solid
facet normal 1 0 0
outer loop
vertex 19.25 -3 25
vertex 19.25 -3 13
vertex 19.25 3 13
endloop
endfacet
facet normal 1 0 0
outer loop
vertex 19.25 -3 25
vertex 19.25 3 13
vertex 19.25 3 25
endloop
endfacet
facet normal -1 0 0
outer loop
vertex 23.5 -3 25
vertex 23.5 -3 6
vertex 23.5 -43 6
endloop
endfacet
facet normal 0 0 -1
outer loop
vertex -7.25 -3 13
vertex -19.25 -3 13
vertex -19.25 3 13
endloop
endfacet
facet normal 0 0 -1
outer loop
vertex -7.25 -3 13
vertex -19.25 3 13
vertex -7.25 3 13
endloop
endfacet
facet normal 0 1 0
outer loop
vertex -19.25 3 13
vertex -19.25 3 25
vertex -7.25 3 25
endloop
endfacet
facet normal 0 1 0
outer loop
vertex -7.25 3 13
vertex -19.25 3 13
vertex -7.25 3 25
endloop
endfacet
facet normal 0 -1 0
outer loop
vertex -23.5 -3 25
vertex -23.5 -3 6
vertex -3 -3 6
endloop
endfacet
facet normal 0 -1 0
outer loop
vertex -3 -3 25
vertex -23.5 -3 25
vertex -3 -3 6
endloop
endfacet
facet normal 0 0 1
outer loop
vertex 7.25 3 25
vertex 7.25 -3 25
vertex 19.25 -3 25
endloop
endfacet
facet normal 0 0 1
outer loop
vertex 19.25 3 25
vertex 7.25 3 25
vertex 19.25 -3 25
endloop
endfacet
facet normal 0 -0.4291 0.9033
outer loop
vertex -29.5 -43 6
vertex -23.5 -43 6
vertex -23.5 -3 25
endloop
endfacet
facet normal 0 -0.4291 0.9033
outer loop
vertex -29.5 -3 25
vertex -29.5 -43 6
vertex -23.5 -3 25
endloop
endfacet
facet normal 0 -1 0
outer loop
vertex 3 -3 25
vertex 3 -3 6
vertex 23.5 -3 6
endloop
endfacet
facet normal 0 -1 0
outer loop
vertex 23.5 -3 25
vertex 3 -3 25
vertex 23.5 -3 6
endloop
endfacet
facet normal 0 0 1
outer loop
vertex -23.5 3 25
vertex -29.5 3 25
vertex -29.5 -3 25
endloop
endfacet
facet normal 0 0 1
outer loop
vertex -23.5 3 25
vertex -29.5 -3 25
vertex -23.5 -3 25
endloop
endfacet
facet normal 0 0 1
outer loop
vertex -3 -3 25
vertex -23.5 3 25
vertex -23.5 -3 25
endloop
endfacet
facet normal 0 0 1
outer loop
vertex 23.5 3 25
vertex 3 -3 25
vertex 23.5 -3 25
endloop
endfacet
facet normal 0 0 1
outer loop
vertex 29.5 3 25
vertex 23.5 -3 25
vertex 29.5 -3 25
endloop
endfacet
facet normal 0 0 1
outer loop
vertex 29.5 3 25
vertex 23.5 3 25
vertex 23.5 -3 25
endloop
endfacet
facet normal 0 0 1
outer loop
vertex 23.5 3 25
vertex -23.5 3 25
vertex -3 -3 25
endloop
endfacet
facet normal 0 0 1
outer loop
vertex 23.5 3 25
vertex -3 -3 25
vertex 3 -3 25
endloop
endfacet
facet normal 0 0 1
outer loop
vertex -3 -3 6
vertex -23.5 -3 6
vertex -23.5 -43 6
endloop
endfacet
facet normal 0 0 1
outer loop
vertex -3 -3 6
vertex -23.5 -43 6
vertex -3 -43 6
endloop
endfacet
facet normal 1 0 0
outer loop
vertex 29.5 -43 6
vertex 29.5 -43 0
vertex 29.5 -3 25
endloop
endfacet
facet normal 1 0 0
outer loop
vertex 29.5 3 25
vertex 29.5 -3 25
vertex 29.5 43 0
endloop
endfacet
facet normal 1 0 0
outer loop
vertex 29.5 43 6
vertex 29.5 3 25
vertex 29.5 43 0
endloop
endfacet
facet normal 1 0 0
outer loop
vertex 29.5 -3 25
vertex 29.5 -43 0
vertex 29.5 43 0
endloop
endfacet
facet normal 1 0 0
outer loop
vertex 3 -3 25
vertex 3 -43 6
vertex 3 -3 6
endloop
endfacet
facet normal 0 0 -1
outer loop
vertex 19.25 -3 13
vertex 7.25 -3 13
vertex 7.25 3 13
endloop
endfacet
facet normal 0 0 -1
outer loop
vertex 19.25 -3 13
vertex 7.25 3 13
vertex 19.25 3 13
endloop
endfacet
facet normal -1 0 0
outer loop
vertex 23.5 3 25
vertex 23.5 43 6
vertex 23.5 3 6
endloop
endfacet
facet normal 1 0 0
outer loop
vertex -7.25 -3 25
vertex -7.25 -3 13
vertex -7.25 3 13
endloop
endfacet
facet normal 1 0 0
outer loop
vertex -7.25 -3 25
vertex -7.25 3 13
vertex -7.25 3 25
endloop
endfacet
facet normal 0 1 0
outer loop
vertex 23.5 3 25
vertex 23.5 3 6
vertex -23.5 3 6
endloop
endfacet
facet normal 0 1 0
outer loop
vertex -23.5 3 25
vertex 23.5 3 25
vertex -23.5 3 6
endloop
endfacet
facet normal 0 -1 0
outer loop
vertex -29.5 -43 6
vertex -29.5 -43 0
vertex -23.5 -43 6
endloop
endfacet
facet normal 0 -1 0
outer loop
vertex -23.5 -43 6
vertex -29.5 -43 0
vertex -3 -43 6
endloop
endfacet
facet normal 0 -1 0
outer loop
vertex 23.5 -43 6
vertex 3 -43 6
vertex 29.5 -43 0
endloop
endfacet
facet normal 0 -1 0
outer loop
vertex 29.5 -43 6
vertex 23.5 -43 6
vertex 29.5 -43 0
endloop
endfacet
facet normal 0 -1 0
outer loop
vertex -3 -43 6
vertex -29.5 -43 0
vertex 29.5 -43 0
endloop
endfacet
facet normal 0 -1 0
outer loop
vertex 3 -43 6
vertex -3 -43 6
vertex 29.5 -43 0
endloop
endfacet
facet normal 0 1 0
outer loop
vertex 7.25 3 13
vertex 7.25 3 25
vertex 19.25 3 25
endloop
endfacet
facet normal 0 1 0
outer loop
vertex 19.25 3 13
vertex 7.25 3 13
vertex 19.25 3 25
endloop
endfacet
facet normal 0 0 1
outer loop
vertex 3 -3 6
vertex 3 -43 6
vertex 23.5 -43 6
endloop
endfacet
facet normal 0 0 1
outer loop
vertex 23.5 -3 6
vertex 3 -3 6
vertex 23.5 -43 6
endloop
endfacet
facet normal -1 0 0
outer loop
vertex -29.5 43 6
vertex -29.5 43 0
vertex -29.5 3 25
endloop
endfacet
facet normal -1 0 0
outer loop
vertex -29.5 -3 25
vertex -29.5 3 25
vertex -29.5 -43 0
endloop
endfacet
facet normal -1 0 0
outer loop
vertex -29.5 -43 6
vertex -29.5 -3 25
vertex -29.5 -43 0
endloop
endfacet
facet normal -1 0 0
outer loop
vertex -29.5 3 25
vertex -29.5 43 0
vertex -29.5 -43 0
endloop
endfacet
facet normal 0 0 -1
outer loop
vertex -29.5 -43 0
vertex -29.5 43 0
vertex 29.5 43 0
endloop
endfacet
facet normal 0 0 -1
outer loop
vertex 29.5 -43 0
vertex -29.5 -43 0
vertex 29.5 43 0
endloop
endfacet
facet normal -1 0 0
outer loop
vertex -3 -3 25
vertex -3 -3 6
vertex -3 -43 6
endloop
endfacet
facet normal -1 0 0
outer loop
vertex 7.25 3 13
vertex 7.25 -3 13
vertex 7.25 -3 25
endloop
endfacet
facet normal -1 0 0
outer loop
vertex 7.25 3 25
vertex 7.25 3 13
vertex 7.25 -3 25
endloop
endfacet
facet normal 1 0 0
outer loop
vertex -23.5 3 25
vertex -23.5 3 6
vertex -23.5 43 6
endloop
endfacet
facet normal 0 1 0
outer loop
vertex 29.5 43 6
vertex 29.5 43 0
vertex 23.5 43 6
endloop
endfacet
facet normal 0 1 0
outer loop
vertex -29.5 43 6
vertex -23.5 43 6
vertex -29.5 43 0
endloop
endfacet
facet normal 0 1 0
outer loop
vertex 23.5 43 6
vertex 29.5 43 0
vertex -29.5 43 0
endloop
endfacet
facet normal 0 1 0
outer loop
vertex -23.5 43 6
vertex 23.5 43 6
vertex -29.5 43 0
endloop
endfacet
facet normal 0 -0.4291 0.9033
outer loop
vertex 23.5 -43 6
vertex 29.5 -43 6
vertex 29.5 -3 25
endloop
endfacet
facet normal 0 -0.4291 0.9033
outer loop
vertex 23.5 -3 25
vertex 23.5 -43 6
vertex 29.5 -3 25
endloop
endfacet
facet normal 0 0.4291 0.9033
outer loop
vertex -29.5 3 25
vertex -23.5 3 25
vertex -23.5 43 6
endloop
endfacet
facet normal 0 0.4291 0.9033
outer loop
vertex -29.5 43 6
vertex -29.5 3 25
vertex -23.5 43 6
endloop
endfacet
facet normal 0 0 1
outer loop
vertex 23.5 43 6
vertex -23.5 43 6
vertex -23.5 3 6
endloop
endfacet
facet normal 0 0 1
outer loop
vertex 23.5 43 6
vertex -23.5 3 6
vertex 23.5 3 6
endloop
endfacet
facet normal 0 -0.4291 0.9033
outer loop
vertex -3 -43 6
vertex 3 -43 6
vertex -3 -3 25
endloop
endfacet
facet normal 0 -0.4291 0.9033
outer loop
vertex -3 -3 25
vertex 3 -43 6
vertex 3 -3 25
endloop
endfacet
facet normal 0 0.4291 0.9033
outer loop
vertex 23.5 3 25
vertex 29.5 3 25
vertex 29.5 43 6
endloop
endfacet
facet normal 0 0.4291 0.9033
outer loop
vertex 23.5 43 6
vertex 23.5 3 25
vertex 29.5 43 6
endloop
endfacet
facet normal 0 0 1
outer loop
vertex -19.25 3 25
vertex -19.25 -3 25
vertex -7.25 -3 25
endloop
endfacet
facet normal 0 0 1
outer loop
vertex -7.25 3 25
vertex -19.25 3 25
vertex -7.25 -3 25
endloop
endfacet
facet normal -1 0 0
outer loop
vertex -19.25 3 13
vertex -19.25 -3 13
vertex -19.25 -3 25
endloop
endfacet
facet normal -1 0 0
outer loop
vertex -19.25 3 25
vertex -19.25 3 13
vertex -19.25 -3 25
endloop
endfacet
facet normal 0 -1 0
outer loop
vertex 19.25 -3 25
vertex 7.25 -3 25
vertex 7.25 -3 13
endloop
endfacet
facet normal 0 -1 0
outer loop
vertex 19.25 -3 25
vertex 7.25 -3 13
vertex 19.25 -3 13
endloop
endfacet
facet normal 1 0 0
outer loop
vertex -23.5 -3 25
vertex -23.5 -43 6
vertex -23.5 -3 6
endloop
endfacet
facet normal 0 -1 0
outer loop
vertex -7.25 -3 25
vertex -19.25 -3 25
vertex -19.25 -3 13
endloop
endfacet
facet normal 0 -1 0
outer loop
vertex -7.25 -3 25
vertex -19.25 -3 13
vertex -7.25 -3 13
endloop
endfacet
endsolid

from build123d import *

# Parameters (mm, degrees)
F0_W     = 59
F0_H     = 86
F1_DEPTH = 6
F3_DEPTH = 19
F5_DEPTH = 59.001
F6_W     = 12
F6_H     = 12
F7_DEPTH = 6


with BuildPart() as f1:
    # F0 (on Top) → F1 (new body)
    with BuildSketch(Plane.XY):
        Rectangle(F0_W, F0_H)
    extrude(amount=F1_DEPTH)

    # F2 (on face) → F3 (join)
    with BuildSketch(Plane.XY.offset(6)):
        Polygon((-23.5, 43), (-29.5, 43), (-29.5, -43), (-23.5, -43), (-23.5, -3), (-3, -3), (-3, -43), (3, -43), (3, -3), (23.5, -3), (23.5, -43), (29.5, -43), (29.5, 43), (23.5, 43), (23.5, 3), (-23.5, 3), align=None)
    extrude(amount=F3_DEPTH)

    # F4 (on face) → F5 (cut, through all)
    with BuildSketch(Plane.YZ.offset(29.5)):
        Polygon((-43, 25), (-43, 6), (-3, 25), align=None)
        Polygon((43, 25), (3, 25), (43, 6), align=None)
    extrude(amount=-F5_DEPTH, mode=Mode.SUBTRACT)


with BuildPart() as f7:
    # F6 (on face) → F7 (new body)
    with BuildSketch(Plane.XZ.offset(3)):
        with Locations((-13.25, 19)):
            Rectangle(F6_W, F6_H)
        with Locations((13.25, 19)):
            Rectangle(F6_W, F6_H)
    extrude(amount=-F7_DEPTH)


solid = Compound([f1.part, f7.part])
